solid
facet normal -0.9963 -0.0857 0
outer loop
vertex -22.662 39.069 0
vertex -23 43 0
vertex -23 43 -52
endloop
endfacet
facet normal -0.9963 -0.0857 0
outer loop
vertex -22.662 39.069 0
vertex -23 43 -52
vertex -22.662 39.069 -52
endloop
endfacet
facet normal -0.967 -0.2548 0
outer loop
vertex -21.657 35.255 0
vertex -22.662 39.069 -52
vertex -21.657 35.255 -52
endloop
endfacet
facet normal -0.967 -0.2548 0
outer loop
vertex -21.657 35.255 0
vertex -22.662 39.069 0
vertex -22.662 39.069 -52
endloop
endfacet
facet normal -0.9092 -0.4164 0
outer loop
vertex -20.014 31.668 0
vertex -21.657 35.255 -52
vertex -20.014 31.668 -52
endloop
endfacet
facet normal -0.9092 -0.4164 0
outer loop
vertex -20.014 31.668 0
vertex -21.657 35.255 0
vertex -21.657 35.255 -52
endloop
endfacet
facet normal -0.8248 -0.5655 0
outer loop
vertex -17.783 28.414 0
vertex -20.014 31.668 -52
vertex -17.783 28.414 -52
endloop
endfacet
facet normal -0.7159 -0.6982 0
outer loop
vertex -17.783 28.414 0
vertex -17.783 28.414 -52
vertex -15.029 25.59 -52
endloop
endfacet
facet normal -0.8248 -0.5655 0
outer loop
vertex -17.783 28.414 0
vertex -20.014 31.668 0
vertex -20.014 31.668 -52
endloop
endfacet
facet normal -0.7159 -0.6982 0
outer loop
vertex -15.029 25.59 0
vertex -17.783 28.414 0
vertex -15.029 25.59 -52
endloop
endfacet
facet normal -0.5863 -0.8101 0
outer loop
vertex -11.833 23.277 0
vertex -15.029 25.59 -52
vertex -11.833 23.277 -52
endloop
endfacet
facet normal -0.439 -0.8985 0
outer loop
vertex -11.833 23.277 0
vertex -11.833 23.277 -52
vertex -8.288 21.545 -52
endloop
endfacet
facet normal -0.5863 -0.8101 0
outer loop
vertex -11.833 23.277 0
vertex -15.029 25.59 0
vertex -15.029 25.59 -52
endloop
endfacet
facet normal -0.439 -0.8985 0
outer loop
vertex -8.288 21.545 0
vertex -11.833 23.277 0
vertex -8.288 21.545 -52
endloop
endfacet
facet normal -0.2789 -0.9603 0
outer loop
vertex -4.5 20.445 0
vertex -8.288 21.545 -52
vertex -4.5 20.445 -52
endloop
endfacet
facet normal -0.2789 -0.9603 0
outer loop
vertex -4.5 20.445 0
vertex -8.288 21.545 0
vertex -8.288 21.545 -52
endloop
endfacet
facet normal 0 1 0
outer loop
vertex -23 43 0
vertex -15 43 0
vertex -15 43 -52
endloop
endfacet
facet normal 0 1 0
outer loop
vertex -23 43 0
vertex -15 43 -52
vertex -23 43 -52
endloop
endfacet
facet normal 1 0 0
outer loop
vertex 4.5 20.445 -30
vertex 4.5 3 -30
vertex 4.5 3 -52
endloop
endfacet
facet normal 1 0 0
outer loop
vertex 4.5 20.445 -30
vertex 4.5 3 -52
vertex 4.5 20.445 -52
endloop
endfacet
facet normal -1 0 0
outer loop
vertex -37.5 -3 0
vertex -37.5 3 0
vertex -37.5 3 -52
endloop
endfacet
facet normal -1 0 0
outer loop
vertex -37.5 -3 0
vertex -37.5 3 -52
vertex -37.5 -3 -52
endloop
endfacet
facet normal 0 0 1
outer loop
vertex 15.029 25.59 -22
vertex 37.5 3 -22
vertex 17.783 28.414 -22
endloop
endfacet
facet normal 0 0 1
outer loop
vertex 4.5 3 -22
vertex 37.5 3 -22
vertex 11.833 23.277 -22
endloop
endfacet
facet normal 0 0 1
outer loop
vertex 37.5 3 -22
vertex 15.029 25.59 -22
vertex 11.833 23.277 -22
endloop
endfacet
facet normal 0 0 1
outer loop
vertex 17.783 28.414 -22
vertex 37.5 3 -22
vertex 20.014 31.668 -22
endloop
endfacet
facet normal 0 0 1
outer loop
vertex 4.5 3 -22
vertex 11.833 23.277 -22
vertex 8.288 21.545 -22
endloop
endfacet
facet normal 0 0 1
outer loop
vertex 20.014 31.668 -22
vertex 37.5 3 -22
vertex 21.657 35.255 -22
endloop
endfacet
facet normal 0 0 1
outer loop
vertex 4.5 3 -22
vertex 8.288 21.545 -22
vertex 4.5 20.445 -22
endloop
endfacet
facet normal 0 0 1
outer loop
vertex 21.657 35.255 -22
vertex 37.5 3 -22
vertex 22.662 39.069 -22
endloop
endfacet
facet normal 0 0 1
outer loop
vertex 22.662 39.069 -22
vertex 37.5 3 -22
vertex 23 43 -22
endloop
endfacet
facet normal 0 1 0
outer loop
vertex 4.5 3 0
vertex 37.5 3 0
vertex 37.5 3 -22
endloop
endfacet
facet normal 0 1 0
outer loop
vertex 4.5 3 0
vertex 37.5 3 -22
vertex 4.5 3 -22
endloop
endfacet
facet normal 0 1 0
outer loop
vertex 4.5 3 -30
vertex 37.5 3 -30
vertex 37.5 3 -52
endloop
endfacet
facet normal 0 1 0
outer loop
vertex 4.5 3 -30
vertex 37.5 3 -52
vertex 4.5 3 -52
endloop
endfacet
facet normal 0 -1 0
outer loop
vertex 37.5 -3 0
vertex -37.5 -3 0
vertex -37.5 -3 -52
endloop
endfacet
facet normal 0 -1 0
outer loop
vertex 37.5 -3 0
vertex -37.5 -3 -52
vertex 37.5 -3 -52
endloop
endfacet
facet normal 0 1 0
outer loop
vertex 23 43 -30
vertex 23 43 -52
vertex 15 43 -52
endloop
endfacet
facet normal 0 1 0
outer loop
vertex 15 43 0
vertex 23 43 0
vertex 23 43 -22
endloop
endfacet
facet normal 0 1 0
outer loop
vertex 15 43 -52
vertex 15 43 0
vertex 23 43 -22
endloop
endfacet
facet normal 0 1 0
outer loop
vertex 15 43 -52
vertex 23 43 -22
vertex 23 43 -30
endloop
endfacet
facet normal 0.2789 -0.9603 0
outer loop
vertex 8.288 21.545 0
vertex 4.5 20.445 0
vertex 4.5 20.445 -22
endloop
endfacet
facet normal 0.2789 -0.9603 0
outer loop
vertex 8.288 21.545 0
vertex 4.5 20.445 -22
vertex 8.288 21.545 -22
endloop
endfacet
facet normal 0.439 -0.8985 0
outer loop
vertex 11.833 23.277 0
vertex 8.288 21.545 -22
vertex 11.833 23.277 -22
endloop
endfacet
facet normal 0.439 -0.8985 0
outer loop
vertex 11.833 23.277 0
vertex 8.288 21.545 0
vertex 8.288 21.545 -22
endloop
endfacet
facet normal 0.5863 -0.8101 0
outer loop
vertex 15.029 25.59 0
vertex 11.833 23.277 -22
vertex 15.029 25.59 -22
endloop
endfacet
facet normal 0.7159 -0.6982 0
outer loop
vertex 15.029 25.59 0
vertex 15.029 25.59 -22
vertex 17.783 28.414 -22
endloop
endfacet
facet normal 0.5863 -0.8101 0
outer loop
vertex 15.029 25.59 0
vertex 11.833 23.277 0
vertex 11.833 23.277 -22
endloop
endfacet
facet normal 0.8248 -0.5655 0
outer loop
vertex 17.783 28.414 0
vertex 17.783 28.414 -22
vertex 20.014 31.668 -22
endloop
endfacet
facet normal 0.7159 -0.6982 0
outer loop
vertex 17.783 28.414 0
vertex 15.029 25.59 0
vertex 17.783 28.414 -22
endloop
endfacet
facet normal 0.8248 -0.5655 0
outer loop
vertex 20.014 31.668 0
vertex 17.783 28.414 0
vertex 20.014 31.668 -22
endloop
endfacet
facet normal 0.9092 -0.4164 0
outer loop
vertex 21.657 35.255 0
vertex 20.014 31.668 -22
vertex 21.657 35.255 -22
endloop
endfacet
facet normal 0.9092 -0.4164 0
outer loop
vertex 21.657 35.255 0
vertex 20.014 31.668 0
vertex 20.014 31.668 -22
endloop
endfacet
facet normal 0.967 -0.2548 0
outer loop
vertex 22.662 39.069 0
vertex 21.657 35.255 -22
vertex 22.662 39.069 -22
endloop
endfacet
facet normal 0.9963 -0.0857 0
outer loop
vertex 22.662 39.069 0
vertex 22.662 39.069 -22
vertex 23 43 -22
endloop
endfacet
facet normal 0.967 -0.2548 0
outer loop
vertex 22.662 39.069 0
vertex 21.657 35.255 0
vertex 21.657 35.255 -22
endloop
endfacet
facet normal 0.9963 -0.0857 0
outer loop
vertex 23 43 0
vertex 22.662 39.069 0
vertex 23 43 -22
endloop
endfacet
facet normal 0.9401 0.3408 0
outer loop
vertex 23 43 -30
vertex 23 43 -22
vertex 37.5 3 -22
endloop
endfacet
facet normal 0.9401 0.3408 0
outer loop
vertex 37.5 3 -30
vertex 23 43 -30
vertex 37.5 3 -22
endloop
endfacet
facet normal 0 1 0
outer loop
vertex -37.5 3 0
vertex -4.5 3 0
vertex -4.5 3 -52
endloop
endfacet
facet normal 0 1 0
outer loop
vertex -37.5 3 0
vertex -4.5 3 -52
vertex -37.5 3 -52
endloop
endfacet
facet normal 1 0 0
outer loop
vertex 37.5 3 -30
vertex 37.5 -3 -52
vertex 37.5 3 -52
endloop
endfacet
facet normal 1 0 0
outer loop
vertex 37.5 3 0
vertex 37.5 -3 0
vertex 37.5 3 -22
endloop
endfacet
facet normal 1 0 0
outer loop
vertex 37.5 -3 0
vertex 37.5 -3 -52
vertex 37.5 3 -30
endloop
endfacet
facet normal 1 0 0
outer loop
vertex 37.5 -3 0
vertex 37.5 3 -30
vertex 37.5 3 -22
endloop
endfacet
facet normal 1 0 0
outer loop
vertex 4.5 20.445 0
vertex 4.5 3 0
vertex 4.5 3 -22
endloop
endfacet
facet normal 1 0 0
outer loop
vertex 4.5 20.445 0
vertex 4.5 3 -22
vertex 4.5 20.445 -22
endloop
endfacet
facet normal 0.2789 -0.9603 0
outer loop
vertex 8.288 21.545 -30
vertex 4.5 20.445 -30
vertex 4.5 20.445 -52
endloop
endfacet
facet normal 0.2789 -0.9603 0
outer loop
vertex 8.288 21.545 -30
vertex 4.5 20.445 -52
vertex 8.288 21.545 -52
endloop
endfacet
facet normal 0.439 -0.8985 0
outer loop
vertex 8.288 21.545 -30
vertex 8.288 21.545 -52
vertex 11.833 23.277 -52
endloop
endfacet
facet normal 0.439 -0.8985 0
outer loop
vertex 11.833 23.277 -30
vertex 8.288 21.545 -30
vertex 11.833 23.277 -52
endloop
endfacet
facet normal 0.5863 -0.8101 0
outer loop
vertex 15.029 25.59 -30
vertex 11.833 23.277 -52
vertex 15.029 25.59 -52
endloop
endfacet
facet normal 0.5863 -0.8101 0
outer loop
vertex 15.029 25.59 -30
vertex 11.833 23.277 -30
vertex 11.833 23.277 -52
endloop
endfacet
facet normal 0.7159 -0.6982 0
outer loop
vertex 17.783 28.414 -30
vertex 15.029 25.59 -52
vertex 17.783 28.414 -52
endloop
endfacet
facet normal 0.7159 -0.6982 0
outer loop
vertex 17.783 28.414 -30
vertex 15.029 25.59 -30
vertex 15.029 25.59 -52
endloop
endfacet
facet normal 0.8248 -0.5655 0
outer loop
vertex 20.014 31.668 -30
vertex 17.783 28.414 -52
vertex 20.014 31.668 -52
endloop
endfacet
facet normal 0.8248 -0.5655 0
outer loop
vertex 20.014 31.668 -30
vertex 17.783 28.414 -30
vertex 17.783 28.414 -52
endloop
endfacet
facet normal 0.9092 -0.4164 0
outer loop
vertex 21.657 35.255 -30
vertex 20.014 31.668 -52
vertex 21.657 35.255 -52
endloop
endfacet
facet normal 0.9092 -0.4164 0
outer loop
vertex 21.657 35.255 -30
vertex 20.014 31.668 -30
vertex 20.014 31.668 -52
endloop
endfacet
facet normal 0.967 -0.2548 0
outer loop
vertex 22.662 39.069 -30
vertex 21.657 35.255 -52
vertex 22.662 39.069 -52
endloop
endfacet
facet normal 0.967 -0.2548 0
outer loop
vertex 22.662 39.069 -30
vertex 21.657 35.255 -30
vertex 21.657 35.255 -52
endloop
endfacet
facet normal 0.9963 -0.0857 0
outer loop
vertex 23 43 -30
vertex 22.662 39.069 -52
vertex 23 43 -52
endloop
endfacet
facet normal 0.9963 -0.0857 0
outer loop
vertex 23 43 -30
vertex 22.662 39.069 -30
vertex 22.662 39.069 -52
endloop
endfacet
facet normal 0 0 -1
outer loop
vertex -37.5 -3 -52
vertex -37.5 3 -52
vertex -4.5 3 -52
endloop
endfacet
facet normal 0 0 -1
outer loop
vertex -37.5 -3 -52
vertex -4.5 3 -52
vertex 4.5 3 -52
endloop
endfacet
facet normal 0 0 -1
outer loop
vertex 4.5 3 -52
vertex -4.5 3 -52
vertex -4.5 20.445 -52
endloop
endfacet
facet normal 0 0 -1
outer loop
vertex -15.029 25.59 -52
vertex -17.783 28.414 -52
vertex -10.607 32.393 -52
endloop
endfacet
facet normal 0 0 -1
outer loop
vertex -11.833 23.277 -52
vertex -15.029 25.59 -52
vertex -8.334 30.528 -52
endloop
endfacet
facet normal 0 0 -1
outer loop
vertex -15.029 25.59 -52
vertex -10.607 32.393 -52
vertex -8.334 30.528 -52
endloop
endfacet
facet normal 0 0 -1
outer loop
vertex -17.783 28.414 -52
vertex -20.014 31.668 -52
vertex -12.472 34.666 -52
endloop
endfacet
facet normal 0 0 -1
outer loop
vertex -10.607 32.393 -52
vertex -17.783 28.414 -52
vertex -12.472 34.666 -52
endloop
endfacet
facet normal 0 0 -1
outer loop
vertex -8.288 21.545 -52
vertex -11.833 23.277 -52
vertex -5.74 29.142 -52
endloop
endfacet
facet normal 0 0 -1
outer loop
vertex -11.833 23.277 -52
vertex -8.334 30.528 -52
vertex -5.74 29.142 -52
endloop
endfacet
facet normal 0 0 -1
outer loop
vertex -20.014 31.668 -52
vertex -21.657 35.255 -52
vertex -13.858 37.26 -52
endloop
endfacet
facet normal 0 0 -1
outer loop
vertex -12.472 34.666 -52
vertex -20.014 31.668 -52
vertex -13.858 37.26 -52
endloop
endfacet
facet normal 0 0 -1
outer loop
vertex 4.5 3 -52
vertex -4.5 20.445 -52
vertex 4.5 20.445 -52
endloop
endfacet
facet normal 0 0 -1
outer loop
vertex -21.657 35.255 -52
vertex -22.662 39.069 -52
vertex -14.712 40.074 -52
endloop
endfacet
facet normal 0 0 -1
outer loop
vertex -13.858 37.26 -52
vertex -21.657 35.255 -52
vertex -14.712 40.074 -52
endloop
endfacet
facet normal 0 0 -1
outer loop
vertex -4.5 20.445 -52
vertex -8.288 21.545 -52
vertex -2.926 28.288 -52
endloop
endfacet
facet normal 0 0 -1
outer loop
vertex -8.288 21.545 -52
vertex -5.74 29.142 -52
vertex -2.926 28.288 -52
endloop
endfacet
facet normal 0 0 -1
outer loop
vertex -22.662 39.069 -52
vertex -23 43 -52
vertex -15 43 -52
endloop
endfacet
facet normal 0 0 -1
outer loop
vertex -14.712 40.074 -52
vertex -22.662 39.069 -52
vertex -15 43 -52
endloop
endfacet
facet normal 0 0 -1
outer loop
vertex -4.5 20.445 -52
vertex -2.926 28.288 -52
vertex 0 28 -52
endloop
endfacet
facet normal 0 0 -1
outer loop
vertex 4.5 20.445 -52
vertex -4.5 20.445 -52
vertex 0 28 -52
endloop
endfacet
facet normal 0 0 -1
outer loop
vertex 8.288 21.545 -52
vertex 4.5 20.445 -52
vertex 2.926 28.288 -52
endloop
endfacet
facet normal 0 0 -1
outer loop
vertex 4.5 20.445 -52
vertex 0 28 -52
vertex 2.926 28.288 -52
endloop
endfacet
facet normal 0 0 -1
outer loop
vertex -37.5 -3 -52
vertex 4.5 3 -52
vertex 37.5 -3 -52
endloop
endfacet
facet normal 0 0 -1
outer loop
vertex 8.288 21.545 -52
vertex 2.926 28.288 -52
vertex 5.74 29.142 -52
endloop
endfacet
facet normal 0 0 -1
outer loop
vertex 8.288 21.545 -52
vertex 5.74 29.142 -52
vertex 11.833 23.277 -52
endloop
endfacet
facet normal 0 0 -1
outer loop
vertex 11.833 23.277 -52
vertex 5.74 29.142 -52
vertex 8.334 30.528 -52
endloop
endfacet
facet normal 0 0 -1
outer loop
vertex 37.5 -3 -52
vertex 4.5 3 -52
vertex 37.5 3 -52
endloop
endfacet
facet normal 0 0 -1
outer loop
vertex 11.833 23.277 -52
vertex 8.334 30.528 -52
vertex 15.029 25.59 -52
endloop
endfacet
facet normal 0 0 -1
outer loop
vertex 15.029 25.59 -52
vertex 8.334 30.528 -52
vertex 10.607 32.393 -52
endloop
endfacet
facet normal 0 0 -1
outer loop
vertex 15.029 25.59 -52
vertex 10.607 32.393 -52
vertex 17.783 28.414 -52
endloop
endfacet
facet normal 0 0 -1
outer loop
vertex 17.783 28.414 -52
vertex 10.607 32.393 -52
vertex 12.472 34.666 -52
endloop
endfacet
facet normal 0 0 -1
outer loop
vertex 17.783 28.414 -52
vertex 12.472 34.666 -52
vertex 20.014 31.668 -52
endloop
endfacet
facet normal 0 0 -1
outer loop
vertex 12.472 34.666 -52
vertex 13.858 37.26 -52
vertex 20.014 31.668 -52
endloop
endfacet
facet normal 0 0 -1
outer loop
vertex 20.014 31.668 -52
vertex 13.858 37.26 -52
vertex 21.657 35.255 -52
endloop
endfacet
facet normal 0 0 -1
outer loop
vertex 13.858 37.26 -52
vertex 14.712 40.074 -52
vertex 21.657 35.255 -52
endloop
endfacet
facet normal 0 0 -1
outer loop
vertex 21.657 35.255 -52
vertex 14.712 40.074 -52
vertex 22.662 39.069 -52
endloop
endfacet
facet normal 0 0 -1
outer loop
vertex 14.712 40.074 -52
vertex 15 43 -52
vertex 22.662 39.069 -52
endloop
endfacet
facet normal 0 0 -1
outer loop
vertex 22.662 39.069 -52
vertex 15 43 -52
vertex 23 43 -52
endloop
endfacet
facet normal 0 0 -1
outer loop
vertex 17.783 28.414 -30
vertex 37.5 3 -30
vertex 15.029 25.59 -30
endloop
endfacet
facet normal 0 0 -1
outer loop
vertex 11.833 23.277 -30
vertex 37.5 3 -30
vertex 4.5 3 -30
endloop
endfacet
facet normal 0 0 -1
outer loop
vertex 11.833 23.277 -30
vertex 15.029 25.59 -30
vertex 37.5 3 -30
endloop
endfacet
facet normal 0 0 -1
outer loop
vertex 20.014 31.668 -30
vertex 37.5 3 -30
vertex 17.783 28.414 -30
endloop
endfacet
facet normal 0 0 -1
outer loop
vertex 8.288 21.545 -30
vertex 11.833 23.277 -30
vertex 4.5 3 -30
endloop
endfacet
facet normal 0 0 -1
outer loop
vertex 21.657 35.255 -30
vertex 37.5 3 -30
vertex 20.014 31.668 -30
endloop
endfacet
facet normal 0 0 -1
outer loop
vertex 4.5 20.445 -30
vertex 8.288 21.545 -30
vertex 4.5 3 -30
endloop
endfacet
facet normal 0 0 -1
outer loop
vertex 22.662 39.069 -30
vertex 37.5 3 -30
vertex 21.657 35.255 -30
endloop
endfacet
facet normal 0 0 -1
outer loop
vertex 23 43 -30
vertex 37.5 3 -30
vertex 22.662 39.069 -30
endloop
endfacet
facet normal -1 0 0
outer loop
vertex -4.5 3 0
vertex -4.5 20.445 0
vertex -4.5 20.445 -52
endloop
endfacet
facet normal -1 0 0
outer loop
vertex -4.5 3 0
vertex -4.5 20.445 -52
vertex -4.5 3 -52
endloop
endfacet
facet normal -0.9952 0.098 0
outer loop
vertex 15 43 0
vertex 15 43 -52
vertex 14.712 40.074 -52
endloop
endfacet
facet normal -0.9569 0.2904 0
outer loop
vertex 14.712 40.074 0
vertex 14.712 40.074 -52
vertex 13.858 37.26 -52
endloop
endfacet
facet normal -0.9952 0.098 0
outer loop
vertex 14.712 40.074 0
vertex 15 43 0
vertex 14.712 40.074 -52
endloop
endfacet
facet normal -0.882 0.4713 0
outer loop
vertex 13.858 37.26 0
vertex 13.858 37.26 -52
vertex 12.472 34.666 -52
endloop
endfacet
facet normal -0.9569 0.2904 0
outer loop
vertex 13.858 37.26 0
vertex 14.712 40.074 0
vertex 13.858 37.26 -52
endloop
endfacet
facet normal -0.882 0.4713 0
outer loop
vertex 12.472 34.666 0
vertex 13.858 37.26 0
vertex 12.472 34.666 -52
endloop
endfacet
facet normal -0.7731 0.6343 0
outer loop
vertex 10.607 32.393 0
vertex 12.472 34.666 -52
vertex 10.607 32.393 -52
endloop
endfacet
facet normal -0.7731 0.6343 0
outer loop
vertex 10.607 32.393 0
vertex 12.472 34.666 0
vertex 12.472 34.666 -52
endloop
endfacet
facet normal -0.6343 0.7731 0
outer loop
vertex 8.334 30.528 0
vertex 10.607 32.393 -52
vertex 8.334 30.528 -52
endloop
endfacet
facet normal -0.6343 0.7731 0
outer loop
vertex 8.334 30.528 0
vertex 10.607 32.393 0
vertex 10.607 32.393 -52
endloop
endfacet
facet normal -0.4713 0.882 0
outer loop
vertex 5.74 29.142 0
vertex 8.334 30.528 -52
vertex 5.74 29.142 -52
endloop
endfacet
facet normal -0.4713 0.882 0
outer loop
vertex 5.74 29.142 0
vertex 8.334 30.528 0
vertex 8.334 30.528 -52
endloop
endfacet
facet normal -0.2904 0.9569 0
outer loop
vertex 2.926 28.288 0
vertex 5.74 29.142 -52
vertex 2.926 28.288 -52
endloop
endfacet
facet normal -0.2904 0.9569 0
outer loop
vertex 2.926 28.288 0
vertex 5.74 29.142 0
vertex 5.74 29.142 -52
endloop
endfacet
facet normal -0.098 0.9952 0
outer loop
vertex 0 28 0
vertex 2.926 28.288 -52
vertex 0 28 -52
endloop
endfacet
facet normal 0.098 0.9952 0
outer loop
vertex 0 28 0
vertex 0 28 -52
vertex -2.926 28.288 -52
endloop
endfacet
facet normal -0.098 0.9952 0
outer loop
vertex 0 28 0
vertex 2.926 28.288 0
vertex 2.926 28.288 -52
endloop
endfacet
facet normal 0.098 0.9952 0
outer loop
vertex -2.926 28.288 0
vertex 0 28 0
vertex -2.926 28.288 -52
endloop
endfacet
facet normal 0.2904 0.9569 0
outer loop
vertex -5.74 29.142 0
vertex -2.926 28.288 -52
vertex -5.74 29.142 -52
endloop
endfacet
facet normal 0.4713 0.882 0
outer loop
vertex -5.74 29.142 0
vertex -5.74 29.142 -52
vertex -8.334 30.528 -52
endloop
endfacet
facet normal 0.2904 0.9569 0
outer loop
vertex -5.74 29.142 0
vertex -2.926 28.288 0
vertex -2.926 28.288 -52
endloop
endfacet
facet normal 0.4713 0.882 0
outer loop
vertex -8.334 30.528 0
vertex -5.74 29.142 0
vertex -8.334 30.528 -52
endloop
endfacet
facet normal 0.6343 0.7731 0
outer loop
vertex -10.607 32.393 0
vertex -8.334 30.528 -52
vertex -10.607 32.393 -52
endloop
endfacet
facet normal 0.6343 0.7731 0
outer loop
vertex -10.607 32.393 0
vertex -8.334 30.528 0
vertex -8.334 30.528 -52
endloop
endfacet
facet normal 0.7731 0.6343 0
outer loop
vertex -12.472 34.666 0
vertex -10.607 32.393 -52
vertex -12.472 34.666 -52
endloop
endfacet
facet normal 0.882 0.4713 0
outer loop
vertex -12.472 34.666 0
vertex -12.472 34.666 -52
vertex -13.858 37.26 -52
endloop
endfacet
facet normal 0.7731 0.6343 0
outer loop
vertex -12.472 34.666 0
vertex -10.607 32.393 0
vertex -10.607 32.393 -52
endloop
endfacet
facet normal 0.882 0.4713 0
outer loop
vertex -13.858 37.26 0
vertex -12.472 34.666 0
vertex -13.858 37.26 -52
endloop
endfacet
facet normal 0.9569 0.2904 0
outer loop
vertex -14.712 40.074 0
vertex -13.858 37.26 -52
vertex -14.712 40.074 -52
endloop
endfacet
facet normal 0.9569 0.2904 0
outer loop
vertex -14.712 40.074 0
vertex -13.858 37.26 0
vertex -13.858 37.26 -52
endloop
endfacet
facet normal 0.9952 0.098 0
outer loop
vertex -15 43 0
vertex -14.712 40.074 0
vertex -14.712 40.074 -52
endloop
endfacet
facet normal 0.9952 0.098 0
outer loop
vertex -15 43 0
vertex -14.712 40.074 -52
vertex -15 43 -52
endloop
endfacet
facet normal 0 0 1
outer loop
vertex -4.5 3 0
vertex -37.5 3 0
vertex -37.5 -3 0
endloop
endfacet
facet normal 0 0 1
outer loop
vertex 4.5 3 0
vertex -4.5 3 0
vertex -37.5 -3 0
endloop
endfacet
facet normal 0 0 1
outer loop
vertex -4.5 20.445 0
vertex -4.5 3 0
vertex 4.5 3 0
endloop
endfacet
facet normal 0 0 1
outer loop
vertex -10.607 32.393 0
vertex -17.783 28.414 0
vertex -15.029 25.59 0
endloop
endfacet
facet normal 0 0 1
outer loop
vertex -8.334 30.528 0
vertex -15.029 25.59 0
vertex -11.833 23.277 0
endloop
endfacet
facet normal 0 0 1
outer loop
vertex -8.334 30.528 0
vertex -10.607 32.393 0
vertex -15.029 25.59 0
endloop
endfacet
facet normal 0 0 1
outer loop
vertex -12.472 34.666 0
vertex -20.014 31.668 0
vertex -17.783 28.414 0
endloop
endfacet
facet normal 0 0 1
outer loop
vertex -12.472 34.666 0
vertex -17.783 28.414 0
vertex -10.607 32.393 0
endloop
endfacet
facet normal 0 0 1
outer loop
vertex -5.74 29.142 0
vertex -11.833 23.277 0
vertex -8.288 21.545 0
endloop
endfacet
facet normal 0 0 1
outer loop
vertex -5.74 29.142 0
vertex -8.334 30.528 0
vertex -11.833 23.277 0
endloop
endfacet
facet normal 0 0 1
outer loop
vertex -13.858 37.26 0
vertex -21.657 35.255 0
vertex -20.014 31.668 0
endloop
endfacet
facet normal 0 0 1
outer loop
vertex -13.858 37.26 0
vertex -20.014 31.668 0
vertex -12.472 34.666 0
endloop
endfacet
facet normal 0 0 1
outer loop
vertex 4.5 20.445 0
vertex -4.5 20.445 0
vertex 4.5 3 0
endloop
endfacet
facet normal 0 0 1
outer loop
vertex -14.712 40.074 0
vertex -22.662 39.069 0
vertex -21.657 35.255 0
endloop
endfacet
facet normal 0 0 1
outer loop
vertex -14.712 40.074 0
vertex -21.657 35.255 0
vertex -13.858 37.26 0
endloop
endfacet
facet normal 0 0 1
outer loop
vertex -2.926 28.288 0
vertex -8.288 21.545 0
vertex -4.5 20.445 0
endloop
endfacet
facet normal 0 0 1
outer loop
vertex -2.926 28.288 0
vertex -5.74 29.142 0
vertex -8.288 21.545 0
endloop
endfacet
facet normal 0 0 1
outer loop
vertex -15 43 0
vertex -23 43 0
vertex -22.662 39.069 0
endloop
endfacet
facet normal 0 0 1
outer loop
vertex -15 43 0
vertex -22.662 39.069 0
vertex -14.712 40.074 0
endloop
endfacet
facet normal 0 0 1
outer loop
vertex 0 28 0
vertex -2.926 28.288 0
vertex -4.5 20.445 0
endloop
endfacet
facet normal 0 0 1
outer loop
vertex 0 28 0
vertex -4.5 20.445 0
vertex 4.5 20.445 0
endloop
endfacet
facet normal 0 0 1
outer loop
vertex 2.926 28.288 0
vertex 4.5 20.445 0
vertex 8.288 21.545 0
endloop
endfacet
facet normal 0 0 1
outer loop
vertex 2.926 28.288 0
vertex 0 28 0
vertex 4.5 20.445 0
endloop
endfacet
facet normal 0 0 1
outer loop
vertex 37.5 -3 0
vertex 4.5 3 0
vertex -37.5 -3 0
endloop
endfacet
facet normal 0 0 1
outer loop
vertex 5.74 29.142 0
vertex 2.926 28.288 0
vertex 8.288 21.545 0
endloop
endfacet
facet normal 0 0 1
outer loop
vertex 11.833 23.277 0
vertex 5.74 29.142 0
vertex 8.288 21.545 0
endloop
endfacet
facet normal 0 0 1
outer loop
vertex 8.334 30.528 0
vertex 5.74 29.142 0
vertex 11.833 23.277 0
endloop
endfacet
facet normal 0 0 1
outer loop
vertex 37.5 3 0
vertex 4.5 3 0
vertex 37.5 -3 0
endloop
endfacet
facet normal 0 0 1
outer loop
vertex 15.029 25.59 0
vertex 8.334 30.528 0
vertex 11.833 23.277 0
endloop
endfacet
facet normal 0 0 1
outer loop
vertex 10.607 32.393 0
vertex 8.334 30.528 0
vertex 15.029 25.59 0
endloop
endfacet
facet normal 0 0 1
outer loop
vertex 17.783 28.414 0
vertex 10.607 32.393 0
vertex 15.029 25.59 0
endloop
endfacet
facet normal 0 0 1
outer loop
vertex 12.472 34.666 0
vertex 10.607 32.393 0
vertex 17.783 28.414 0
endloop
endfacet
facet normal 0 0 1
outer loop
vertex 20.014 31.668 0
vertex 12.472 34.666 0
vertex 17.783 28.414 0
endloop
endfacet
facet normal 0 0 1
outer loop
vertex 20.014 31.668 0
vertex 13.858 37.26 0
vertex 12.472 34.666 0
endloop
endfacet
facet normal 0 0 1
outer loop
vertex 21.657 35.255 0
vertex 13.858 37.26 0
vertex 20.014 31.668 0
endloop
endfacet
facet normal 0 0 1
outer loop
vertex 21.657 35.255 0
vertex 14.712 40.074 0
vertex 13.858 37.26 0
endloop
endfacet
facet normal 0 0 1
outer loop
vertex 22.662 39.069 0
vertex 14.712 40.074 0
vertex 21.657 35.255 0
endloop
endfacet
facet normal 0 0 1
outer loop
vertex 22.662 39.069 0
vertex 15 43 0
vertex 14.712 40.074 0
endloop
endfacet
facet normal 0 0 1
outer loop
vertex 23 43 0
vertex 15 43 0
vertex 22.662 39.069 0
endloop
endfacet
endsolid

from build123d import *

# Parameters (mm, degrees)
BOSS_EXTRUDE1_DEPTH = 52
BOSS_EXTRUDE2_START = -22
BOSS_EXTRUDE2_DEPTH = 8


with BuildPart() as part:
    # Sketch1 → Boss-Extrude1 (new body)
    with BuildSketch(Plane.XY):
        with BuildLine():
            Line((-4.5, 20.444512863), (-4.5, 3))
            Line((-4.5, 3), (0, 3))
            Line((0, 3), (4.5, 3))
            Line((4.5, 3), (4.5, 20.444512863))
            ThreePointArc((4.5, 20.444512863), (17.783419244, 28.414047854), (23, 43))
            Line((23, 43), (15, 43))
            ThreePointArc((15, 43), (0, 28), (-15, 43))
            Line((-15, 43), (-23, 43))
            ThreePointArc((-23, 43), (-17.783419244, 28.414047854), (-4.5, 20.444512863))
        make_face()
        Polygon((-4.5, 3), (-37.5, 3), (-37.5, -3), (37.5, -3), (37.5, 3), (4.5, 3), (0, 3), align=None)
    extrude(amount=-BOSS_EXTRUDE1_DEPTH)

    # Sketch7 → Boss-Extrude2 (add)
    with BuildSketch(Plane.XY.offset(BOSS_EXTRUDE2_START)):
        with BuildLine():
            Line((23, 43), (37.5, 3))
            Line((37.5, 3), (4.5, 3))
            Line((4.5, 3), (4.5, 20.444512863))
            ThreePointArc((4.5, 20.444512863), (17.783419244, 28.414047854), (23, 43))
        make_face()
    extrude(amount=-BOSS_EXTRUDE2_DEPTH)


solid = part.part
